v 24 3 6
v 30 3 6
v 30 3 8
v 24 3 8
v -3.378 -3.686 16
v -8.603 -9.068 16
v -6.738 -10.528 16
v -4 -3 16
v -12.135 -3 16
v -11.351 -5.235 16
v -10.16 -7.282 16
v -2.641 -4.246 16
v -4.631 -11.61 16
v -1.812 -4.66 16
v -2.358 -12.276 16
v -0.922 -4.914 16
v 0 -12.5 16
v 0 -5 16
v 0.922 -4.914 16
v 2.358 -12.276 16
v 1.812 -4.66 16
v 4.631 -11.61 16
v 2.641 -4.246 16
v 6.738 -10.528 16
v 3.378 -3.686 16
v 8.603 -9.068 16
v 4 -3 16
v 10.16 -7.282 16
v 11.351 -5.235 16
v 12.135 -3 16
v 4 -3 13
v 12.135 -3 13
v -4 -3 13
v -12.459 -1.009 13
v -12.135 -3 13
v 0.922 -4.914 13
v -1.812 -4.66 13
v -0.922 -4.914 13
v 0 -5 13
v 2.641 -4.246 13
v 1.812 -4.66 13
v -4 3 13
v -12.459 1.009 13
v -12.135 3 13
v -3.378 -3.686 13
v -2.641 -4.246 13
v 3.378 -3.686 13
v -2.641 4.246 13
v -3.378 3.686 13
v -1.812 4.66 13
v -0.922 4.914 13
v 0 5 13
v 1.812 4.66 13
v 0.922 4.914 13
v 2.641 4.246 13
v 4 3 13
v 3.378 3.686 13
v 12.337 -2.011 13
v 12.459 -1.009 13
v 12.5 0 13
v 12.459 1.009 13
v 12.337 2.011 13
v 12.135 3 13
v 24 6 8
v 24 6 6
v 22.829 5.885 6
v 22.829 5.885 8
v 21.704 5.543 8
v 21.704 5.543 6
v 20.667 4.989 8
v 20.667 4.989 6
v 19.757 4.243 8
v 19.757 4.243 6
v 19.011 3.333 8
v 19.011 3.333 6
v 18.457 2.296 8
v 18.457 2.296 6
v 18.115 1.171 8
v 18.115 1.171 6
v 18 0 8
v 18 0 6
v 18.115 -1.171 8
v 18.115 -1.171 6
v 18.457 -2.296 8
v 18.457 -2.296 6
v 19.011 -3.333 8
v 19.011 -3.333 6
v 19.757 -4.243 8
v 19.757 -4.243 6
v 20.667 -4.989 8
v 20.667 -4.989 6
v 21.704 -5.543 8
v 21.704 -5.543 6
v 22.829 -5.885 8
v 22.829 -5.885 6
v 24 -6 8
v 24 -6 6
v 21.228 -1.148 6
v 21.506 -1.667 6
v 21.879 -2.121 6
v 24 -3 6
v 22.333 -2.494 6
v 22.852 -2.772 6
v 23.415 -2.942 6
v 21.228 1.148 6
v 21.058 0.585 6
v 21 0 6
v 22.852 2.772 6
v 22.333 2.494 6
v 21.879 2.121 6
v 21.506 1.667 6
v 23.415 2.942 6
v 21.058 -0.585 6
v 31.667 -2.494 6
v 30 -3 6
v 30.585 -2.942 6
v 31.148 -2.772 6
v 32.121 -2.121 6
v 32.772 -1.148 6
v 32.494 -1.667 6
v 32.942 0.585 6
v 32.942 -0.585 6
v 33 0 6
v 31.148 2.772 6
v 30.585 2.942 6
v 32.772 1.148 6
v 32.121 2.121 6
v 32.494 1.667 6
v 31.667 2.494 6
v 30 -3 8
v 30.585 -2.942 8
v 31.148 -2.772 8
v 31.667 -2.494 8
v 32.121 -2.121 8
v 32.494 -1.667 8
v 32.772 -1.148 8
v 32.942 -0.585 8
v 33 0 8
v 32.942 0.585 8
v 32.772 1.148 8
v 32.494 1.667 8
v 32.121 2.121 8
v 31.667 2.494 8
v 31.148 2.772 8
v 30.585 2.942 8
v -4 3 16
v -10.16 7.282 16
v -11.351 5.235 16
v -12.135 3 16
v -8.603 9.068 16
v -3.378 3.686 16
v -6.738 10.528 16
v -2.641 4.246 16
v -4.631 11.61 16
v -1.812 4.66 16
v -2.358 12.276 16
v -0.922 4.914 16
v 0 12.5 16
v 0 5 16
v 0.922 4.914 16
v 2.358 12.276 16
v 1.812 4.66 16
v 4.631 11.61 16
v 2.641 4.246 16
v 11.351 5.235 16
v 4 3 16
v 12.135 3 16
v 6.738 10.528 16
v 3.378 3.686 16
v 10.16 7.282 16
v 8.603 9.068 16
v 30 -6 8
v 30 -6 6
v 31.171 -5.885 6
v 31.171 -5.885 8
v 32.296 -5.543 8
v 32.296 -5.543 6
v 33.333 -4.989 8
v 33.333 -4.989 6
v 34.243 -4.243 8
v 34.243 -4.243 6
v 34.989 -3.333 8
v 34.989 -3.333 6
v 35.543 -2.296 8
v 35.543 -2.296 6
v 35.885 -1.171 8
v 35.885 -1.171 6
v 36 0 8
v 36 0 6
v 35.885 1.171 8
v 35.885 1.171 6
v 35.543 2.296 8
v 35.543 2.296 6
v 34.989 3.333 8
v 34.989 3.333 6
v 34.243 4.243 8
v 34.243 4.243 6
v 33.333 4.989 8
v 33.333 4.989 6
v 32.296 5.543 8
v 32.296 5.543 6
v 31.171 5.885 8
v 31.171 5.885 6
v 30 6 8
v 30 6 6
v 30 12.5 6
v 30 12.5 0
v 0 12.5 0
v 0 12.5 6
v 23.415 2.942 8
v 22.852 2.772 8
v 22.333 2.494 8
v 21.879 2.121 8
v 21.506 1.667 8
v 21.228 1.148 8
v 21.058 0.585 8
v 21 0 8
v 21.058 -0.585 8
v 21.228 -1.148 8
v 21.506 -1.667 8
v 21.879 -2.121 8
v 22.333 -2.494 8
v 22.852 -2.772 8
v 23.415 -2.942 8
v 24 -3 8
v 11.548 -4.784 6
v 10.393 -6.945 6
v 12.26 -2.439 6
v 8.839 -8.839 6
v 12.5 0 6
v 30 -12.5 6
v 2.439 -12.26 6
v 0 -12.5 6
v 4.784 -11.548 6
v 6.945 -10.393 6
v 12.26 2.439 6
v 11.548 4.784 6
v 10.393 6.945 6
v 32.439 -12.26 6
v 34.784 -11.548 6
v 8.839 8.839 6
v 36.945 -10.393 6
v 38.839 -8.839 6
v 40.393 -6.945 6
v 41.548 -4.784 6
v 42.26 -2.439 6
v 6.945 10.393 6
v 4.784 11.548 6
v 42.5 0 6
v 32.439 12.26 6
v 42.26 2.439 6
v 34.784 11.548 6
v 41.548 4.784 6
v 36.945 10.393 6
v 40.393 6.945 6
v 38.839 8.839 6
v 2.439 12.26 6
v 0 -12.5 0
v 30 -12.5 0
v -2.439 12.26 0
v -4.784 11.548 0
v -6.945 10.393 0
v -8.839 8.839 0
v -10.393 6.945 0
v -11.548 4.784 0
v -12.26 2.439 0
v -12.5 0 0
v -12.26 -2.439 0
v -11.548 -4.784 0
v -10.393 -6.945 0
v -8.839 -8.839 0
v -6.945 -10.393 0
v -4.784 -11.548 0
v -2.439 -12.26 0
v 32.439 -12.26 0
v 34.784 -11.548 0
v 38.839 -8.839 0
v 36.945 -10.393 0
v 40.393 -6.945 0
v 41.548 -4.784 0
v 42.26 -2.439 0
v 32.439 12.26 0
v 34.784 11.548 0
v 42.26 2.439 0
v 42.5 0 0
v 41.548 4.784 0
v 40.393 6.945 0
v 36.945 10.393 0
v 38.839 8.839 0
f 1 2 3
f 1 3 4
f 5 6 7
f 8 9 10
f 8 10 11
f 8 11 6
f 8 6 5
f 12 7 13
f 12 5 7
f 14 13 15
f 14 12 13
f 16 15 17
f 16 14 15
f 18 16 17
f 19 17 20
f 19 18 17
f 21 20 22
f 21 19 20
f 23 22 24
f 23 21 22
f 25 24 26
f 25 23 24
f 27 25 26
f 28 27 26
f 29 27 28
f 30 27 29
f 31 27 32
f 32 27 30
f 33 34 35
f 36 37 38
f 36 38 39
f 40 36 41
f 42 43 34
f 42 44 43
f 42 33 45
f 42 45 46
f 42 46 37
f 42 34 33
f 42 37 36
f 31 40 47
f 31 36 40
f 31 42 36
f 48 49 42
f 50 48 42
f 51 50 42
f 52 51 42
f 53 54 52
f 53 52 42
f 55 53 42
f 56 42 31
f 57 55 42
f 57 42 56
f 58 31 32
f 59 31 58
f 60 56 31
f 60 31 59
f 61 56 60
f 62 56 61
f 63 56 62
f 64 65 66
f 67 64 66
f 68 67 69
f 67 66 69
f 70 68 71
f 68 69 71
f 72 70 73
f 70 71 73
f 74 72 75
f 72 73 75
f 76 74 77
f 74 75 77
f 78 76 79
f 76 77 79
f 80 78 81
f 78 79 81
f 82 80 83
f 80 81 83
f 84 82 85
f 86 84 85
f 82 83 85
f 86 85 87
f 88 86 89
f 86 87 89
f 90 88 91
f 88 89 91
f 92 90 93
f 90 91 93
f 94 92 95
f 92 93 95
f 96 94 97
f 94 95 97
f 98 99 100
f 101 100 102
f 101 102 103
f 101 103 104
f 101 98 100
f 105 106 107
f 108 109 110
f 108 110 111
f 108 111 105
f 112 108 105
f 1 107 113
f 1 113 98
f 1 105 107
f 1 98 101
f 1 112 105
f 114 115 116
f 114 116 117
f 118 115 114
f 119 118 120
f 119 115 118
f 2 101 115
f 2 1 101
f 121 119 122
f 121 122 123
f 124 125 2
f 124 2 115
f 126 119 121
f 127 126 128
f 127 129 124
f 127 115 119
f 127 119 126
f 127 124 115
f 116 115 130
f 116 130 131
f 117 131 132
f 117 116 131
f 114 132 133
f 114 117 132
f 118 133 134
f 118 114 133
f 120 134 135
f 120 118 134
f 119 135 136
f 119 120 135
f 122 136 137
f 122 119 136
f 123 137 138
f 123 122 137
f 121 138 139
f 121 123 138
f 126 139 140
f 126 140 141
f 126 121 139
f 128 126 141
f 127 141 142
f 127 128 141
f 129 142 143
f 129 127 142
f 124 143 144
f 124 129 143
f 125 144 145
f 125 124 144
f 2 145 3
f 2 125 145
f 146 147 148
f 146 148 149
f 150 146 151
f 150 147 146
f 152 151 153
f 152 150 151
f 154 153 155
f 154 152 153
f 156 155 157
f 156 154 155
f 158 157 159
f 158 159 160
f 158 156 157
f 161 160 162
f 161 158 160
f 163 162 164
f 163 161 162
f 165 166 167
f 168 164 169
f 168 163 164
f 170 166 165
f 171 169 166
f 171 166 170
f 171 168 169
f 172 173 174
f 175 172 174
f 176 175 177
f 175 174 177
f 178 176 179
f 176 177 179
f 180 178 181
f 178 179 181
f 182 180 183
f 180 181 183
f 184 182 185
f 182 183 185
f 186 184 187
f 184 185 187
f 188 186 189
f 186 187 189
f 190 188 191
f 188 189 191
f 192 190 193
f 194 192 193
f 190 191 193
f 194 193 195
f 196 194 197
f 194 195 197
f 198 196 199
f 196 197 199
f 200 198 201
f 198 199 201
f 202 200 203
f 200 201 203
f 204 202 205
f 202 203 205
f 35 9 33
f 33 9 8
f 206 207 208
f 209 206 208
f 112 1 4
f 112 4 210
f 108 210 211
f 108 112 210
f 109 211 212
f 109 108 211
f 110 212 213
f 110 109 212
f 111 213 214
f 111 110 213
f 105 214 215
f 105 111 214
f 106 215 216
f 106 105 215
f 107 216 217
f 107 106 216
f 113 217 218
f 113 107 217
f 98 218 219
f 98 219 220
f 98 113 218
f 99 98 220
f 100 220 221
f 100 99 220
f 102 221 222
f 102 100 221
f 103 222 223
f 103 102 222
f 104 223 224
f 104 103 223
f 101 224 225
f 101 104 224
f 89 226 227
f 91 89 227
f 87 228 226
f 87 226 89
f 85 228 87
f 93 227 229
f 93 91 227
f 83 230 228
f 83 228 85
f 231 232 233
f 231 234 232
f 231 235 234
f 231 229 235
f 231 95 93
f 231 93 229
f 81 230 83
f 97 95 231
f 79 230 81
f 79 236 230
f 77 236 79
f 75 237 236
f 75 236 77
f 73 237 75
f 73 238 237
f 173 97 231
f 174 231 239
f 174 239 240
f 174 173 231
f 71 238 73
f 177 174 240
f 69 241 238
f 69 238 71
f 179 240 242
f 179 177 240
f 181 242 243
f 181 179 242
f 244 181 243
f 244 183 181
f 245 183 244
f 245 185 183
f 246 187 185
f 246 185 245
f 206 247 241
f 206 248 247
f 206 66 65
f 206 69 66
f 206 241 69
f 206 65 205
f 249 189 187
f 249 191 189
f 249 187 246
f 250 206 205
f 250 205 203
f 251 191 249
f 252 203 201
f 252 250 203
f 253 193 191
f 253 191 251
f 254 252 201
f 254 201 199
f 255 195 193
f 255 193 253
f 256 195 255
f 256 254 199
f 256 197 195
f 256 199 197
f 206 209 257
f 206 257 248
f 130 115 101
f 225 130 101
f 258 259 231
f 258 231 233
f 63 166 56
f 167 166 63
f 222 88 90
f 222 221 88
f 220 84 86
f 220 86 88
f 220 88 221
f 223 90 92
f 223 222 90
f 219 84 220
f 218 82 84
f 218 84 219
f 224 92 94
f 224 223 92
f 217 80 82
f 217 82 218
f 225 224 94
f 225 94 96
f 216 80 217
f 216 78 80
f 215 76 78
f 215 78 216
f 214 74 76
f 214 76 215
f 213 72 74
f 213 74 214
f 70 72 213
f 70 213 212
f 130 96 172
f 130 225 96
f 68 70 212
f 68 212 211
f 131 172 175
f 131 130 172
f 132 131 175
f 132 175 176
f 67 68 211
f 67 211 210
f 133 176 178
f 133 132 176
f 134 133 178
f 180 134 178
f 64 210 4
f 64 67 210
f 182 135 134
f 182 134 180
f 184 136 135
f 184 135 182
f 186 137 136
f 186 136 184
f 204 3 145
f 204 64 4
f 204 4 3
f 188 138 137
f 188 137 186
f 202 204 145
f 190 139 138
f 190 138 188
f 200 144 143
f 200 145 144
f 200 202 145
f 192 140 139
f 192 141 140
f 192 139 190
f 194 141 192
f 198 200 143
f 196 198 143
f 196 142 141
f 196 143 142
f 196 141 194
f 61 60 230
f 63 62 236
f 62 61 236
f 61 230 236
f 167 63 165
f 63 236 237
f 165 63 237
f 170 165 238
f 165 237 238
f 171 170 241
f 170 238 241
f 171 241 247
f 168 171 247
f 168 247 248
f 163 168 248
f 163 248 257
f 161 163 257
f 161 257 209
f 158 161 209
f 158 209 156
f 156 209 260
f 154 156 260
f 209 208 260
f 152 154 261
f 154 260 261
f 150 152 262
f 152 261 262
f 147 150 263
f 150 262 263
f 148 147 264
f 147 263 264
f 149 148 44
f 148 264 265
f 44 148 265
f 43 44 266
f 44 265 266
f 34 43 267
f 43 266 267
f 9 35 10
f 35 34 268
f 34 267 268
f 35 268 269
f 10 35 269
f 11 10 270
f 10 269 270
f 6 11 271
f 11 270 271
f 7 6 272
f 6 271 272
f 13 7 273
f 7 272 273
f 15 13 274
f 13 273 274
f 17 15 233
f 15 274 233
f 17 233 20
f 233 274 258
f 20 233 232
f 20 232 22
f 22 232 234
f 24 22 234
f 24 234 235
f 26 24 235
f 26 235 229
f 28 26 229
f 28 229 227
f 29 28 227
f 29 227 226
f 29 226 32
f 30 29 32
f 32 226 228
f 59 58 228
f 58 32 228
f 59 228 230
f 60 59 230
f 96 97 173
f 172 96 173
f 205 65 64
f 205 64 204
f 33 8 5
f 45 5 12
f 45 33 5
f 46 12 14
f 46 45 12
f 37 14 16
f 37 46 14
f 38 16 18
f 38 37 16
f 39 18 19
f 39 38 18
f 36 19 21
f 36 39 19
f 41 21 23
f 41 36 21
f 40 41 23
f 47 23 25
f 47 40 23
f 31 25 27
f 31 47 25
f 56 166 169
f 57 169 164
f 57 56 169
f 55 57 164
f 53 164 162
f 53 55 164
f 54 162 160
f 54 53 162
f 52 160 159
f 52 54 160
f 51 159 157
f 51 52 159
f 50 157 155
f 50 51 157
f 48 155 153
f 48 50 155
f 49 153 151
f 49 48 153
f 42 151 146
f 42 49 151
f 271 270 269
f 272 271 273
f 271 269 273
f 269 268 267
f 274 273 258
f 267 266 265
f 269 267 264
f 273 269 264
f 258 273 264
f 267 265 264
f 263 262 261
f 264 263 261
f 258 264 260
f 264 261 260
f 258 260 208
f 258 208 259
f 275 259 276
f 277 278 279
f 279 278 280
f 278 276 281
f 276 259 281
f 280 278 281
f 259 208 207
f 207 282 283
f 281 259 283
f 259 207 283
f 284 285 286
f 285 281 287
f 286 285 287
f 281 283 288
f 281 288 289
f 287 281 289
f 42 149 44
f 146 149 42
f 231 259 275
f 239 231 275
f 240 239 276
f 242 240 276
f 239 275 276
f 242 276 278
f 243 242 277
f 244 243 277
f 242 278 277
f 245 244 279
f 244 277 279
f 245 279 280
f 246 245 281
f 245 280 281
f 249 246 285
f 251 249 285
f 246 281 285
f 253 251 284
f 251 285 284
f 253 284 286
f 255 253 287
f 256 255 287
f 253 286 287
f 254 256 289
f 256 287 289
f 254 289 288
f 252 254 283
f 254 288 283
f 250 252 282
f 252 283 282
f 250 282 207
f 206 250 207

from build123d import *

# Parameters (mm, degrees)
PAD_DEPTH       = 6
SKETCH001_R     = 12.5
PAD001_DEPTH    = 10
SKETCH002_W     = 29.813109
SKETCH002_H     = 6
POCKET_DEPTH    = 3
SKETCH003_R     = 5
POCKET001_DEPTH = 5
PAD002_DEPTH    = 2


with BuildPart() as part:
    # Sketch → Pad (new body)
    with BuildSketch(Plane.XY):
        with BuildLine():
            ThreePointArc((30, -12.5), (42.5, 0), (30, 12.5))
            Line((30, 12.5), (0, 12.5))
            ThreePointArc((0, 12.5), (-12.5, 0), (0, -12.5))
            Line((30, -12.5), (0, -12.5))
        make_face()
    extrude(amount=PAD_DEPTH)

    # Sketch001 → Pad001 (new body)
    with BuildSketch(Plane.XY.offset(6)):
        Circle(SKETCH001_R)
    extrude(amount=PAD001_DEPTH)

    # Sketch002 → Pocket (cut)
    with BuildSketch(Plane.XY.offset(16)):
        with Locations((1.105551, 0)):
            Rectangle(SKETCH002_W, SKETCH002_H)
    extrude(amount=-POCKET_DEPTH, mode=Mode.SUBTRACT)

    # Sketch003 → Pocket001 (cut)
    with BuildSketch(Plane.XY.offset(13)):
        Circle(SKETCH003_R)
    extrude(amount=POCKET001_DEPTH, mode=Mode.SUBTRACT)

    # Sketch004 → Pad002 (new body)
    with BuildSketch(Plane.XY.offset(6)):
        with BuildLine():
            ThreePointArc((24, 6), (18, 0), (24, -6))
            Line((24, -6), (30, -6))
            ThreePointArc((30, -6), (36, 0), (30, 6))
            Line((24, 6), (30, 6))
        make_face()
        with BuildLine():
            ThreePointArc((30, -3), (33, 0), (30, 3))
            Line((30, 3), (24, 3))
            ThreePointArc((24, 3), (21, 0), (24, -3))
            Line((30, -3), (24, -3))
        make_face(mode=Mode.SUBTRACT)
    extrude(amount=PAD002_DEPTH)


solid = part.part
